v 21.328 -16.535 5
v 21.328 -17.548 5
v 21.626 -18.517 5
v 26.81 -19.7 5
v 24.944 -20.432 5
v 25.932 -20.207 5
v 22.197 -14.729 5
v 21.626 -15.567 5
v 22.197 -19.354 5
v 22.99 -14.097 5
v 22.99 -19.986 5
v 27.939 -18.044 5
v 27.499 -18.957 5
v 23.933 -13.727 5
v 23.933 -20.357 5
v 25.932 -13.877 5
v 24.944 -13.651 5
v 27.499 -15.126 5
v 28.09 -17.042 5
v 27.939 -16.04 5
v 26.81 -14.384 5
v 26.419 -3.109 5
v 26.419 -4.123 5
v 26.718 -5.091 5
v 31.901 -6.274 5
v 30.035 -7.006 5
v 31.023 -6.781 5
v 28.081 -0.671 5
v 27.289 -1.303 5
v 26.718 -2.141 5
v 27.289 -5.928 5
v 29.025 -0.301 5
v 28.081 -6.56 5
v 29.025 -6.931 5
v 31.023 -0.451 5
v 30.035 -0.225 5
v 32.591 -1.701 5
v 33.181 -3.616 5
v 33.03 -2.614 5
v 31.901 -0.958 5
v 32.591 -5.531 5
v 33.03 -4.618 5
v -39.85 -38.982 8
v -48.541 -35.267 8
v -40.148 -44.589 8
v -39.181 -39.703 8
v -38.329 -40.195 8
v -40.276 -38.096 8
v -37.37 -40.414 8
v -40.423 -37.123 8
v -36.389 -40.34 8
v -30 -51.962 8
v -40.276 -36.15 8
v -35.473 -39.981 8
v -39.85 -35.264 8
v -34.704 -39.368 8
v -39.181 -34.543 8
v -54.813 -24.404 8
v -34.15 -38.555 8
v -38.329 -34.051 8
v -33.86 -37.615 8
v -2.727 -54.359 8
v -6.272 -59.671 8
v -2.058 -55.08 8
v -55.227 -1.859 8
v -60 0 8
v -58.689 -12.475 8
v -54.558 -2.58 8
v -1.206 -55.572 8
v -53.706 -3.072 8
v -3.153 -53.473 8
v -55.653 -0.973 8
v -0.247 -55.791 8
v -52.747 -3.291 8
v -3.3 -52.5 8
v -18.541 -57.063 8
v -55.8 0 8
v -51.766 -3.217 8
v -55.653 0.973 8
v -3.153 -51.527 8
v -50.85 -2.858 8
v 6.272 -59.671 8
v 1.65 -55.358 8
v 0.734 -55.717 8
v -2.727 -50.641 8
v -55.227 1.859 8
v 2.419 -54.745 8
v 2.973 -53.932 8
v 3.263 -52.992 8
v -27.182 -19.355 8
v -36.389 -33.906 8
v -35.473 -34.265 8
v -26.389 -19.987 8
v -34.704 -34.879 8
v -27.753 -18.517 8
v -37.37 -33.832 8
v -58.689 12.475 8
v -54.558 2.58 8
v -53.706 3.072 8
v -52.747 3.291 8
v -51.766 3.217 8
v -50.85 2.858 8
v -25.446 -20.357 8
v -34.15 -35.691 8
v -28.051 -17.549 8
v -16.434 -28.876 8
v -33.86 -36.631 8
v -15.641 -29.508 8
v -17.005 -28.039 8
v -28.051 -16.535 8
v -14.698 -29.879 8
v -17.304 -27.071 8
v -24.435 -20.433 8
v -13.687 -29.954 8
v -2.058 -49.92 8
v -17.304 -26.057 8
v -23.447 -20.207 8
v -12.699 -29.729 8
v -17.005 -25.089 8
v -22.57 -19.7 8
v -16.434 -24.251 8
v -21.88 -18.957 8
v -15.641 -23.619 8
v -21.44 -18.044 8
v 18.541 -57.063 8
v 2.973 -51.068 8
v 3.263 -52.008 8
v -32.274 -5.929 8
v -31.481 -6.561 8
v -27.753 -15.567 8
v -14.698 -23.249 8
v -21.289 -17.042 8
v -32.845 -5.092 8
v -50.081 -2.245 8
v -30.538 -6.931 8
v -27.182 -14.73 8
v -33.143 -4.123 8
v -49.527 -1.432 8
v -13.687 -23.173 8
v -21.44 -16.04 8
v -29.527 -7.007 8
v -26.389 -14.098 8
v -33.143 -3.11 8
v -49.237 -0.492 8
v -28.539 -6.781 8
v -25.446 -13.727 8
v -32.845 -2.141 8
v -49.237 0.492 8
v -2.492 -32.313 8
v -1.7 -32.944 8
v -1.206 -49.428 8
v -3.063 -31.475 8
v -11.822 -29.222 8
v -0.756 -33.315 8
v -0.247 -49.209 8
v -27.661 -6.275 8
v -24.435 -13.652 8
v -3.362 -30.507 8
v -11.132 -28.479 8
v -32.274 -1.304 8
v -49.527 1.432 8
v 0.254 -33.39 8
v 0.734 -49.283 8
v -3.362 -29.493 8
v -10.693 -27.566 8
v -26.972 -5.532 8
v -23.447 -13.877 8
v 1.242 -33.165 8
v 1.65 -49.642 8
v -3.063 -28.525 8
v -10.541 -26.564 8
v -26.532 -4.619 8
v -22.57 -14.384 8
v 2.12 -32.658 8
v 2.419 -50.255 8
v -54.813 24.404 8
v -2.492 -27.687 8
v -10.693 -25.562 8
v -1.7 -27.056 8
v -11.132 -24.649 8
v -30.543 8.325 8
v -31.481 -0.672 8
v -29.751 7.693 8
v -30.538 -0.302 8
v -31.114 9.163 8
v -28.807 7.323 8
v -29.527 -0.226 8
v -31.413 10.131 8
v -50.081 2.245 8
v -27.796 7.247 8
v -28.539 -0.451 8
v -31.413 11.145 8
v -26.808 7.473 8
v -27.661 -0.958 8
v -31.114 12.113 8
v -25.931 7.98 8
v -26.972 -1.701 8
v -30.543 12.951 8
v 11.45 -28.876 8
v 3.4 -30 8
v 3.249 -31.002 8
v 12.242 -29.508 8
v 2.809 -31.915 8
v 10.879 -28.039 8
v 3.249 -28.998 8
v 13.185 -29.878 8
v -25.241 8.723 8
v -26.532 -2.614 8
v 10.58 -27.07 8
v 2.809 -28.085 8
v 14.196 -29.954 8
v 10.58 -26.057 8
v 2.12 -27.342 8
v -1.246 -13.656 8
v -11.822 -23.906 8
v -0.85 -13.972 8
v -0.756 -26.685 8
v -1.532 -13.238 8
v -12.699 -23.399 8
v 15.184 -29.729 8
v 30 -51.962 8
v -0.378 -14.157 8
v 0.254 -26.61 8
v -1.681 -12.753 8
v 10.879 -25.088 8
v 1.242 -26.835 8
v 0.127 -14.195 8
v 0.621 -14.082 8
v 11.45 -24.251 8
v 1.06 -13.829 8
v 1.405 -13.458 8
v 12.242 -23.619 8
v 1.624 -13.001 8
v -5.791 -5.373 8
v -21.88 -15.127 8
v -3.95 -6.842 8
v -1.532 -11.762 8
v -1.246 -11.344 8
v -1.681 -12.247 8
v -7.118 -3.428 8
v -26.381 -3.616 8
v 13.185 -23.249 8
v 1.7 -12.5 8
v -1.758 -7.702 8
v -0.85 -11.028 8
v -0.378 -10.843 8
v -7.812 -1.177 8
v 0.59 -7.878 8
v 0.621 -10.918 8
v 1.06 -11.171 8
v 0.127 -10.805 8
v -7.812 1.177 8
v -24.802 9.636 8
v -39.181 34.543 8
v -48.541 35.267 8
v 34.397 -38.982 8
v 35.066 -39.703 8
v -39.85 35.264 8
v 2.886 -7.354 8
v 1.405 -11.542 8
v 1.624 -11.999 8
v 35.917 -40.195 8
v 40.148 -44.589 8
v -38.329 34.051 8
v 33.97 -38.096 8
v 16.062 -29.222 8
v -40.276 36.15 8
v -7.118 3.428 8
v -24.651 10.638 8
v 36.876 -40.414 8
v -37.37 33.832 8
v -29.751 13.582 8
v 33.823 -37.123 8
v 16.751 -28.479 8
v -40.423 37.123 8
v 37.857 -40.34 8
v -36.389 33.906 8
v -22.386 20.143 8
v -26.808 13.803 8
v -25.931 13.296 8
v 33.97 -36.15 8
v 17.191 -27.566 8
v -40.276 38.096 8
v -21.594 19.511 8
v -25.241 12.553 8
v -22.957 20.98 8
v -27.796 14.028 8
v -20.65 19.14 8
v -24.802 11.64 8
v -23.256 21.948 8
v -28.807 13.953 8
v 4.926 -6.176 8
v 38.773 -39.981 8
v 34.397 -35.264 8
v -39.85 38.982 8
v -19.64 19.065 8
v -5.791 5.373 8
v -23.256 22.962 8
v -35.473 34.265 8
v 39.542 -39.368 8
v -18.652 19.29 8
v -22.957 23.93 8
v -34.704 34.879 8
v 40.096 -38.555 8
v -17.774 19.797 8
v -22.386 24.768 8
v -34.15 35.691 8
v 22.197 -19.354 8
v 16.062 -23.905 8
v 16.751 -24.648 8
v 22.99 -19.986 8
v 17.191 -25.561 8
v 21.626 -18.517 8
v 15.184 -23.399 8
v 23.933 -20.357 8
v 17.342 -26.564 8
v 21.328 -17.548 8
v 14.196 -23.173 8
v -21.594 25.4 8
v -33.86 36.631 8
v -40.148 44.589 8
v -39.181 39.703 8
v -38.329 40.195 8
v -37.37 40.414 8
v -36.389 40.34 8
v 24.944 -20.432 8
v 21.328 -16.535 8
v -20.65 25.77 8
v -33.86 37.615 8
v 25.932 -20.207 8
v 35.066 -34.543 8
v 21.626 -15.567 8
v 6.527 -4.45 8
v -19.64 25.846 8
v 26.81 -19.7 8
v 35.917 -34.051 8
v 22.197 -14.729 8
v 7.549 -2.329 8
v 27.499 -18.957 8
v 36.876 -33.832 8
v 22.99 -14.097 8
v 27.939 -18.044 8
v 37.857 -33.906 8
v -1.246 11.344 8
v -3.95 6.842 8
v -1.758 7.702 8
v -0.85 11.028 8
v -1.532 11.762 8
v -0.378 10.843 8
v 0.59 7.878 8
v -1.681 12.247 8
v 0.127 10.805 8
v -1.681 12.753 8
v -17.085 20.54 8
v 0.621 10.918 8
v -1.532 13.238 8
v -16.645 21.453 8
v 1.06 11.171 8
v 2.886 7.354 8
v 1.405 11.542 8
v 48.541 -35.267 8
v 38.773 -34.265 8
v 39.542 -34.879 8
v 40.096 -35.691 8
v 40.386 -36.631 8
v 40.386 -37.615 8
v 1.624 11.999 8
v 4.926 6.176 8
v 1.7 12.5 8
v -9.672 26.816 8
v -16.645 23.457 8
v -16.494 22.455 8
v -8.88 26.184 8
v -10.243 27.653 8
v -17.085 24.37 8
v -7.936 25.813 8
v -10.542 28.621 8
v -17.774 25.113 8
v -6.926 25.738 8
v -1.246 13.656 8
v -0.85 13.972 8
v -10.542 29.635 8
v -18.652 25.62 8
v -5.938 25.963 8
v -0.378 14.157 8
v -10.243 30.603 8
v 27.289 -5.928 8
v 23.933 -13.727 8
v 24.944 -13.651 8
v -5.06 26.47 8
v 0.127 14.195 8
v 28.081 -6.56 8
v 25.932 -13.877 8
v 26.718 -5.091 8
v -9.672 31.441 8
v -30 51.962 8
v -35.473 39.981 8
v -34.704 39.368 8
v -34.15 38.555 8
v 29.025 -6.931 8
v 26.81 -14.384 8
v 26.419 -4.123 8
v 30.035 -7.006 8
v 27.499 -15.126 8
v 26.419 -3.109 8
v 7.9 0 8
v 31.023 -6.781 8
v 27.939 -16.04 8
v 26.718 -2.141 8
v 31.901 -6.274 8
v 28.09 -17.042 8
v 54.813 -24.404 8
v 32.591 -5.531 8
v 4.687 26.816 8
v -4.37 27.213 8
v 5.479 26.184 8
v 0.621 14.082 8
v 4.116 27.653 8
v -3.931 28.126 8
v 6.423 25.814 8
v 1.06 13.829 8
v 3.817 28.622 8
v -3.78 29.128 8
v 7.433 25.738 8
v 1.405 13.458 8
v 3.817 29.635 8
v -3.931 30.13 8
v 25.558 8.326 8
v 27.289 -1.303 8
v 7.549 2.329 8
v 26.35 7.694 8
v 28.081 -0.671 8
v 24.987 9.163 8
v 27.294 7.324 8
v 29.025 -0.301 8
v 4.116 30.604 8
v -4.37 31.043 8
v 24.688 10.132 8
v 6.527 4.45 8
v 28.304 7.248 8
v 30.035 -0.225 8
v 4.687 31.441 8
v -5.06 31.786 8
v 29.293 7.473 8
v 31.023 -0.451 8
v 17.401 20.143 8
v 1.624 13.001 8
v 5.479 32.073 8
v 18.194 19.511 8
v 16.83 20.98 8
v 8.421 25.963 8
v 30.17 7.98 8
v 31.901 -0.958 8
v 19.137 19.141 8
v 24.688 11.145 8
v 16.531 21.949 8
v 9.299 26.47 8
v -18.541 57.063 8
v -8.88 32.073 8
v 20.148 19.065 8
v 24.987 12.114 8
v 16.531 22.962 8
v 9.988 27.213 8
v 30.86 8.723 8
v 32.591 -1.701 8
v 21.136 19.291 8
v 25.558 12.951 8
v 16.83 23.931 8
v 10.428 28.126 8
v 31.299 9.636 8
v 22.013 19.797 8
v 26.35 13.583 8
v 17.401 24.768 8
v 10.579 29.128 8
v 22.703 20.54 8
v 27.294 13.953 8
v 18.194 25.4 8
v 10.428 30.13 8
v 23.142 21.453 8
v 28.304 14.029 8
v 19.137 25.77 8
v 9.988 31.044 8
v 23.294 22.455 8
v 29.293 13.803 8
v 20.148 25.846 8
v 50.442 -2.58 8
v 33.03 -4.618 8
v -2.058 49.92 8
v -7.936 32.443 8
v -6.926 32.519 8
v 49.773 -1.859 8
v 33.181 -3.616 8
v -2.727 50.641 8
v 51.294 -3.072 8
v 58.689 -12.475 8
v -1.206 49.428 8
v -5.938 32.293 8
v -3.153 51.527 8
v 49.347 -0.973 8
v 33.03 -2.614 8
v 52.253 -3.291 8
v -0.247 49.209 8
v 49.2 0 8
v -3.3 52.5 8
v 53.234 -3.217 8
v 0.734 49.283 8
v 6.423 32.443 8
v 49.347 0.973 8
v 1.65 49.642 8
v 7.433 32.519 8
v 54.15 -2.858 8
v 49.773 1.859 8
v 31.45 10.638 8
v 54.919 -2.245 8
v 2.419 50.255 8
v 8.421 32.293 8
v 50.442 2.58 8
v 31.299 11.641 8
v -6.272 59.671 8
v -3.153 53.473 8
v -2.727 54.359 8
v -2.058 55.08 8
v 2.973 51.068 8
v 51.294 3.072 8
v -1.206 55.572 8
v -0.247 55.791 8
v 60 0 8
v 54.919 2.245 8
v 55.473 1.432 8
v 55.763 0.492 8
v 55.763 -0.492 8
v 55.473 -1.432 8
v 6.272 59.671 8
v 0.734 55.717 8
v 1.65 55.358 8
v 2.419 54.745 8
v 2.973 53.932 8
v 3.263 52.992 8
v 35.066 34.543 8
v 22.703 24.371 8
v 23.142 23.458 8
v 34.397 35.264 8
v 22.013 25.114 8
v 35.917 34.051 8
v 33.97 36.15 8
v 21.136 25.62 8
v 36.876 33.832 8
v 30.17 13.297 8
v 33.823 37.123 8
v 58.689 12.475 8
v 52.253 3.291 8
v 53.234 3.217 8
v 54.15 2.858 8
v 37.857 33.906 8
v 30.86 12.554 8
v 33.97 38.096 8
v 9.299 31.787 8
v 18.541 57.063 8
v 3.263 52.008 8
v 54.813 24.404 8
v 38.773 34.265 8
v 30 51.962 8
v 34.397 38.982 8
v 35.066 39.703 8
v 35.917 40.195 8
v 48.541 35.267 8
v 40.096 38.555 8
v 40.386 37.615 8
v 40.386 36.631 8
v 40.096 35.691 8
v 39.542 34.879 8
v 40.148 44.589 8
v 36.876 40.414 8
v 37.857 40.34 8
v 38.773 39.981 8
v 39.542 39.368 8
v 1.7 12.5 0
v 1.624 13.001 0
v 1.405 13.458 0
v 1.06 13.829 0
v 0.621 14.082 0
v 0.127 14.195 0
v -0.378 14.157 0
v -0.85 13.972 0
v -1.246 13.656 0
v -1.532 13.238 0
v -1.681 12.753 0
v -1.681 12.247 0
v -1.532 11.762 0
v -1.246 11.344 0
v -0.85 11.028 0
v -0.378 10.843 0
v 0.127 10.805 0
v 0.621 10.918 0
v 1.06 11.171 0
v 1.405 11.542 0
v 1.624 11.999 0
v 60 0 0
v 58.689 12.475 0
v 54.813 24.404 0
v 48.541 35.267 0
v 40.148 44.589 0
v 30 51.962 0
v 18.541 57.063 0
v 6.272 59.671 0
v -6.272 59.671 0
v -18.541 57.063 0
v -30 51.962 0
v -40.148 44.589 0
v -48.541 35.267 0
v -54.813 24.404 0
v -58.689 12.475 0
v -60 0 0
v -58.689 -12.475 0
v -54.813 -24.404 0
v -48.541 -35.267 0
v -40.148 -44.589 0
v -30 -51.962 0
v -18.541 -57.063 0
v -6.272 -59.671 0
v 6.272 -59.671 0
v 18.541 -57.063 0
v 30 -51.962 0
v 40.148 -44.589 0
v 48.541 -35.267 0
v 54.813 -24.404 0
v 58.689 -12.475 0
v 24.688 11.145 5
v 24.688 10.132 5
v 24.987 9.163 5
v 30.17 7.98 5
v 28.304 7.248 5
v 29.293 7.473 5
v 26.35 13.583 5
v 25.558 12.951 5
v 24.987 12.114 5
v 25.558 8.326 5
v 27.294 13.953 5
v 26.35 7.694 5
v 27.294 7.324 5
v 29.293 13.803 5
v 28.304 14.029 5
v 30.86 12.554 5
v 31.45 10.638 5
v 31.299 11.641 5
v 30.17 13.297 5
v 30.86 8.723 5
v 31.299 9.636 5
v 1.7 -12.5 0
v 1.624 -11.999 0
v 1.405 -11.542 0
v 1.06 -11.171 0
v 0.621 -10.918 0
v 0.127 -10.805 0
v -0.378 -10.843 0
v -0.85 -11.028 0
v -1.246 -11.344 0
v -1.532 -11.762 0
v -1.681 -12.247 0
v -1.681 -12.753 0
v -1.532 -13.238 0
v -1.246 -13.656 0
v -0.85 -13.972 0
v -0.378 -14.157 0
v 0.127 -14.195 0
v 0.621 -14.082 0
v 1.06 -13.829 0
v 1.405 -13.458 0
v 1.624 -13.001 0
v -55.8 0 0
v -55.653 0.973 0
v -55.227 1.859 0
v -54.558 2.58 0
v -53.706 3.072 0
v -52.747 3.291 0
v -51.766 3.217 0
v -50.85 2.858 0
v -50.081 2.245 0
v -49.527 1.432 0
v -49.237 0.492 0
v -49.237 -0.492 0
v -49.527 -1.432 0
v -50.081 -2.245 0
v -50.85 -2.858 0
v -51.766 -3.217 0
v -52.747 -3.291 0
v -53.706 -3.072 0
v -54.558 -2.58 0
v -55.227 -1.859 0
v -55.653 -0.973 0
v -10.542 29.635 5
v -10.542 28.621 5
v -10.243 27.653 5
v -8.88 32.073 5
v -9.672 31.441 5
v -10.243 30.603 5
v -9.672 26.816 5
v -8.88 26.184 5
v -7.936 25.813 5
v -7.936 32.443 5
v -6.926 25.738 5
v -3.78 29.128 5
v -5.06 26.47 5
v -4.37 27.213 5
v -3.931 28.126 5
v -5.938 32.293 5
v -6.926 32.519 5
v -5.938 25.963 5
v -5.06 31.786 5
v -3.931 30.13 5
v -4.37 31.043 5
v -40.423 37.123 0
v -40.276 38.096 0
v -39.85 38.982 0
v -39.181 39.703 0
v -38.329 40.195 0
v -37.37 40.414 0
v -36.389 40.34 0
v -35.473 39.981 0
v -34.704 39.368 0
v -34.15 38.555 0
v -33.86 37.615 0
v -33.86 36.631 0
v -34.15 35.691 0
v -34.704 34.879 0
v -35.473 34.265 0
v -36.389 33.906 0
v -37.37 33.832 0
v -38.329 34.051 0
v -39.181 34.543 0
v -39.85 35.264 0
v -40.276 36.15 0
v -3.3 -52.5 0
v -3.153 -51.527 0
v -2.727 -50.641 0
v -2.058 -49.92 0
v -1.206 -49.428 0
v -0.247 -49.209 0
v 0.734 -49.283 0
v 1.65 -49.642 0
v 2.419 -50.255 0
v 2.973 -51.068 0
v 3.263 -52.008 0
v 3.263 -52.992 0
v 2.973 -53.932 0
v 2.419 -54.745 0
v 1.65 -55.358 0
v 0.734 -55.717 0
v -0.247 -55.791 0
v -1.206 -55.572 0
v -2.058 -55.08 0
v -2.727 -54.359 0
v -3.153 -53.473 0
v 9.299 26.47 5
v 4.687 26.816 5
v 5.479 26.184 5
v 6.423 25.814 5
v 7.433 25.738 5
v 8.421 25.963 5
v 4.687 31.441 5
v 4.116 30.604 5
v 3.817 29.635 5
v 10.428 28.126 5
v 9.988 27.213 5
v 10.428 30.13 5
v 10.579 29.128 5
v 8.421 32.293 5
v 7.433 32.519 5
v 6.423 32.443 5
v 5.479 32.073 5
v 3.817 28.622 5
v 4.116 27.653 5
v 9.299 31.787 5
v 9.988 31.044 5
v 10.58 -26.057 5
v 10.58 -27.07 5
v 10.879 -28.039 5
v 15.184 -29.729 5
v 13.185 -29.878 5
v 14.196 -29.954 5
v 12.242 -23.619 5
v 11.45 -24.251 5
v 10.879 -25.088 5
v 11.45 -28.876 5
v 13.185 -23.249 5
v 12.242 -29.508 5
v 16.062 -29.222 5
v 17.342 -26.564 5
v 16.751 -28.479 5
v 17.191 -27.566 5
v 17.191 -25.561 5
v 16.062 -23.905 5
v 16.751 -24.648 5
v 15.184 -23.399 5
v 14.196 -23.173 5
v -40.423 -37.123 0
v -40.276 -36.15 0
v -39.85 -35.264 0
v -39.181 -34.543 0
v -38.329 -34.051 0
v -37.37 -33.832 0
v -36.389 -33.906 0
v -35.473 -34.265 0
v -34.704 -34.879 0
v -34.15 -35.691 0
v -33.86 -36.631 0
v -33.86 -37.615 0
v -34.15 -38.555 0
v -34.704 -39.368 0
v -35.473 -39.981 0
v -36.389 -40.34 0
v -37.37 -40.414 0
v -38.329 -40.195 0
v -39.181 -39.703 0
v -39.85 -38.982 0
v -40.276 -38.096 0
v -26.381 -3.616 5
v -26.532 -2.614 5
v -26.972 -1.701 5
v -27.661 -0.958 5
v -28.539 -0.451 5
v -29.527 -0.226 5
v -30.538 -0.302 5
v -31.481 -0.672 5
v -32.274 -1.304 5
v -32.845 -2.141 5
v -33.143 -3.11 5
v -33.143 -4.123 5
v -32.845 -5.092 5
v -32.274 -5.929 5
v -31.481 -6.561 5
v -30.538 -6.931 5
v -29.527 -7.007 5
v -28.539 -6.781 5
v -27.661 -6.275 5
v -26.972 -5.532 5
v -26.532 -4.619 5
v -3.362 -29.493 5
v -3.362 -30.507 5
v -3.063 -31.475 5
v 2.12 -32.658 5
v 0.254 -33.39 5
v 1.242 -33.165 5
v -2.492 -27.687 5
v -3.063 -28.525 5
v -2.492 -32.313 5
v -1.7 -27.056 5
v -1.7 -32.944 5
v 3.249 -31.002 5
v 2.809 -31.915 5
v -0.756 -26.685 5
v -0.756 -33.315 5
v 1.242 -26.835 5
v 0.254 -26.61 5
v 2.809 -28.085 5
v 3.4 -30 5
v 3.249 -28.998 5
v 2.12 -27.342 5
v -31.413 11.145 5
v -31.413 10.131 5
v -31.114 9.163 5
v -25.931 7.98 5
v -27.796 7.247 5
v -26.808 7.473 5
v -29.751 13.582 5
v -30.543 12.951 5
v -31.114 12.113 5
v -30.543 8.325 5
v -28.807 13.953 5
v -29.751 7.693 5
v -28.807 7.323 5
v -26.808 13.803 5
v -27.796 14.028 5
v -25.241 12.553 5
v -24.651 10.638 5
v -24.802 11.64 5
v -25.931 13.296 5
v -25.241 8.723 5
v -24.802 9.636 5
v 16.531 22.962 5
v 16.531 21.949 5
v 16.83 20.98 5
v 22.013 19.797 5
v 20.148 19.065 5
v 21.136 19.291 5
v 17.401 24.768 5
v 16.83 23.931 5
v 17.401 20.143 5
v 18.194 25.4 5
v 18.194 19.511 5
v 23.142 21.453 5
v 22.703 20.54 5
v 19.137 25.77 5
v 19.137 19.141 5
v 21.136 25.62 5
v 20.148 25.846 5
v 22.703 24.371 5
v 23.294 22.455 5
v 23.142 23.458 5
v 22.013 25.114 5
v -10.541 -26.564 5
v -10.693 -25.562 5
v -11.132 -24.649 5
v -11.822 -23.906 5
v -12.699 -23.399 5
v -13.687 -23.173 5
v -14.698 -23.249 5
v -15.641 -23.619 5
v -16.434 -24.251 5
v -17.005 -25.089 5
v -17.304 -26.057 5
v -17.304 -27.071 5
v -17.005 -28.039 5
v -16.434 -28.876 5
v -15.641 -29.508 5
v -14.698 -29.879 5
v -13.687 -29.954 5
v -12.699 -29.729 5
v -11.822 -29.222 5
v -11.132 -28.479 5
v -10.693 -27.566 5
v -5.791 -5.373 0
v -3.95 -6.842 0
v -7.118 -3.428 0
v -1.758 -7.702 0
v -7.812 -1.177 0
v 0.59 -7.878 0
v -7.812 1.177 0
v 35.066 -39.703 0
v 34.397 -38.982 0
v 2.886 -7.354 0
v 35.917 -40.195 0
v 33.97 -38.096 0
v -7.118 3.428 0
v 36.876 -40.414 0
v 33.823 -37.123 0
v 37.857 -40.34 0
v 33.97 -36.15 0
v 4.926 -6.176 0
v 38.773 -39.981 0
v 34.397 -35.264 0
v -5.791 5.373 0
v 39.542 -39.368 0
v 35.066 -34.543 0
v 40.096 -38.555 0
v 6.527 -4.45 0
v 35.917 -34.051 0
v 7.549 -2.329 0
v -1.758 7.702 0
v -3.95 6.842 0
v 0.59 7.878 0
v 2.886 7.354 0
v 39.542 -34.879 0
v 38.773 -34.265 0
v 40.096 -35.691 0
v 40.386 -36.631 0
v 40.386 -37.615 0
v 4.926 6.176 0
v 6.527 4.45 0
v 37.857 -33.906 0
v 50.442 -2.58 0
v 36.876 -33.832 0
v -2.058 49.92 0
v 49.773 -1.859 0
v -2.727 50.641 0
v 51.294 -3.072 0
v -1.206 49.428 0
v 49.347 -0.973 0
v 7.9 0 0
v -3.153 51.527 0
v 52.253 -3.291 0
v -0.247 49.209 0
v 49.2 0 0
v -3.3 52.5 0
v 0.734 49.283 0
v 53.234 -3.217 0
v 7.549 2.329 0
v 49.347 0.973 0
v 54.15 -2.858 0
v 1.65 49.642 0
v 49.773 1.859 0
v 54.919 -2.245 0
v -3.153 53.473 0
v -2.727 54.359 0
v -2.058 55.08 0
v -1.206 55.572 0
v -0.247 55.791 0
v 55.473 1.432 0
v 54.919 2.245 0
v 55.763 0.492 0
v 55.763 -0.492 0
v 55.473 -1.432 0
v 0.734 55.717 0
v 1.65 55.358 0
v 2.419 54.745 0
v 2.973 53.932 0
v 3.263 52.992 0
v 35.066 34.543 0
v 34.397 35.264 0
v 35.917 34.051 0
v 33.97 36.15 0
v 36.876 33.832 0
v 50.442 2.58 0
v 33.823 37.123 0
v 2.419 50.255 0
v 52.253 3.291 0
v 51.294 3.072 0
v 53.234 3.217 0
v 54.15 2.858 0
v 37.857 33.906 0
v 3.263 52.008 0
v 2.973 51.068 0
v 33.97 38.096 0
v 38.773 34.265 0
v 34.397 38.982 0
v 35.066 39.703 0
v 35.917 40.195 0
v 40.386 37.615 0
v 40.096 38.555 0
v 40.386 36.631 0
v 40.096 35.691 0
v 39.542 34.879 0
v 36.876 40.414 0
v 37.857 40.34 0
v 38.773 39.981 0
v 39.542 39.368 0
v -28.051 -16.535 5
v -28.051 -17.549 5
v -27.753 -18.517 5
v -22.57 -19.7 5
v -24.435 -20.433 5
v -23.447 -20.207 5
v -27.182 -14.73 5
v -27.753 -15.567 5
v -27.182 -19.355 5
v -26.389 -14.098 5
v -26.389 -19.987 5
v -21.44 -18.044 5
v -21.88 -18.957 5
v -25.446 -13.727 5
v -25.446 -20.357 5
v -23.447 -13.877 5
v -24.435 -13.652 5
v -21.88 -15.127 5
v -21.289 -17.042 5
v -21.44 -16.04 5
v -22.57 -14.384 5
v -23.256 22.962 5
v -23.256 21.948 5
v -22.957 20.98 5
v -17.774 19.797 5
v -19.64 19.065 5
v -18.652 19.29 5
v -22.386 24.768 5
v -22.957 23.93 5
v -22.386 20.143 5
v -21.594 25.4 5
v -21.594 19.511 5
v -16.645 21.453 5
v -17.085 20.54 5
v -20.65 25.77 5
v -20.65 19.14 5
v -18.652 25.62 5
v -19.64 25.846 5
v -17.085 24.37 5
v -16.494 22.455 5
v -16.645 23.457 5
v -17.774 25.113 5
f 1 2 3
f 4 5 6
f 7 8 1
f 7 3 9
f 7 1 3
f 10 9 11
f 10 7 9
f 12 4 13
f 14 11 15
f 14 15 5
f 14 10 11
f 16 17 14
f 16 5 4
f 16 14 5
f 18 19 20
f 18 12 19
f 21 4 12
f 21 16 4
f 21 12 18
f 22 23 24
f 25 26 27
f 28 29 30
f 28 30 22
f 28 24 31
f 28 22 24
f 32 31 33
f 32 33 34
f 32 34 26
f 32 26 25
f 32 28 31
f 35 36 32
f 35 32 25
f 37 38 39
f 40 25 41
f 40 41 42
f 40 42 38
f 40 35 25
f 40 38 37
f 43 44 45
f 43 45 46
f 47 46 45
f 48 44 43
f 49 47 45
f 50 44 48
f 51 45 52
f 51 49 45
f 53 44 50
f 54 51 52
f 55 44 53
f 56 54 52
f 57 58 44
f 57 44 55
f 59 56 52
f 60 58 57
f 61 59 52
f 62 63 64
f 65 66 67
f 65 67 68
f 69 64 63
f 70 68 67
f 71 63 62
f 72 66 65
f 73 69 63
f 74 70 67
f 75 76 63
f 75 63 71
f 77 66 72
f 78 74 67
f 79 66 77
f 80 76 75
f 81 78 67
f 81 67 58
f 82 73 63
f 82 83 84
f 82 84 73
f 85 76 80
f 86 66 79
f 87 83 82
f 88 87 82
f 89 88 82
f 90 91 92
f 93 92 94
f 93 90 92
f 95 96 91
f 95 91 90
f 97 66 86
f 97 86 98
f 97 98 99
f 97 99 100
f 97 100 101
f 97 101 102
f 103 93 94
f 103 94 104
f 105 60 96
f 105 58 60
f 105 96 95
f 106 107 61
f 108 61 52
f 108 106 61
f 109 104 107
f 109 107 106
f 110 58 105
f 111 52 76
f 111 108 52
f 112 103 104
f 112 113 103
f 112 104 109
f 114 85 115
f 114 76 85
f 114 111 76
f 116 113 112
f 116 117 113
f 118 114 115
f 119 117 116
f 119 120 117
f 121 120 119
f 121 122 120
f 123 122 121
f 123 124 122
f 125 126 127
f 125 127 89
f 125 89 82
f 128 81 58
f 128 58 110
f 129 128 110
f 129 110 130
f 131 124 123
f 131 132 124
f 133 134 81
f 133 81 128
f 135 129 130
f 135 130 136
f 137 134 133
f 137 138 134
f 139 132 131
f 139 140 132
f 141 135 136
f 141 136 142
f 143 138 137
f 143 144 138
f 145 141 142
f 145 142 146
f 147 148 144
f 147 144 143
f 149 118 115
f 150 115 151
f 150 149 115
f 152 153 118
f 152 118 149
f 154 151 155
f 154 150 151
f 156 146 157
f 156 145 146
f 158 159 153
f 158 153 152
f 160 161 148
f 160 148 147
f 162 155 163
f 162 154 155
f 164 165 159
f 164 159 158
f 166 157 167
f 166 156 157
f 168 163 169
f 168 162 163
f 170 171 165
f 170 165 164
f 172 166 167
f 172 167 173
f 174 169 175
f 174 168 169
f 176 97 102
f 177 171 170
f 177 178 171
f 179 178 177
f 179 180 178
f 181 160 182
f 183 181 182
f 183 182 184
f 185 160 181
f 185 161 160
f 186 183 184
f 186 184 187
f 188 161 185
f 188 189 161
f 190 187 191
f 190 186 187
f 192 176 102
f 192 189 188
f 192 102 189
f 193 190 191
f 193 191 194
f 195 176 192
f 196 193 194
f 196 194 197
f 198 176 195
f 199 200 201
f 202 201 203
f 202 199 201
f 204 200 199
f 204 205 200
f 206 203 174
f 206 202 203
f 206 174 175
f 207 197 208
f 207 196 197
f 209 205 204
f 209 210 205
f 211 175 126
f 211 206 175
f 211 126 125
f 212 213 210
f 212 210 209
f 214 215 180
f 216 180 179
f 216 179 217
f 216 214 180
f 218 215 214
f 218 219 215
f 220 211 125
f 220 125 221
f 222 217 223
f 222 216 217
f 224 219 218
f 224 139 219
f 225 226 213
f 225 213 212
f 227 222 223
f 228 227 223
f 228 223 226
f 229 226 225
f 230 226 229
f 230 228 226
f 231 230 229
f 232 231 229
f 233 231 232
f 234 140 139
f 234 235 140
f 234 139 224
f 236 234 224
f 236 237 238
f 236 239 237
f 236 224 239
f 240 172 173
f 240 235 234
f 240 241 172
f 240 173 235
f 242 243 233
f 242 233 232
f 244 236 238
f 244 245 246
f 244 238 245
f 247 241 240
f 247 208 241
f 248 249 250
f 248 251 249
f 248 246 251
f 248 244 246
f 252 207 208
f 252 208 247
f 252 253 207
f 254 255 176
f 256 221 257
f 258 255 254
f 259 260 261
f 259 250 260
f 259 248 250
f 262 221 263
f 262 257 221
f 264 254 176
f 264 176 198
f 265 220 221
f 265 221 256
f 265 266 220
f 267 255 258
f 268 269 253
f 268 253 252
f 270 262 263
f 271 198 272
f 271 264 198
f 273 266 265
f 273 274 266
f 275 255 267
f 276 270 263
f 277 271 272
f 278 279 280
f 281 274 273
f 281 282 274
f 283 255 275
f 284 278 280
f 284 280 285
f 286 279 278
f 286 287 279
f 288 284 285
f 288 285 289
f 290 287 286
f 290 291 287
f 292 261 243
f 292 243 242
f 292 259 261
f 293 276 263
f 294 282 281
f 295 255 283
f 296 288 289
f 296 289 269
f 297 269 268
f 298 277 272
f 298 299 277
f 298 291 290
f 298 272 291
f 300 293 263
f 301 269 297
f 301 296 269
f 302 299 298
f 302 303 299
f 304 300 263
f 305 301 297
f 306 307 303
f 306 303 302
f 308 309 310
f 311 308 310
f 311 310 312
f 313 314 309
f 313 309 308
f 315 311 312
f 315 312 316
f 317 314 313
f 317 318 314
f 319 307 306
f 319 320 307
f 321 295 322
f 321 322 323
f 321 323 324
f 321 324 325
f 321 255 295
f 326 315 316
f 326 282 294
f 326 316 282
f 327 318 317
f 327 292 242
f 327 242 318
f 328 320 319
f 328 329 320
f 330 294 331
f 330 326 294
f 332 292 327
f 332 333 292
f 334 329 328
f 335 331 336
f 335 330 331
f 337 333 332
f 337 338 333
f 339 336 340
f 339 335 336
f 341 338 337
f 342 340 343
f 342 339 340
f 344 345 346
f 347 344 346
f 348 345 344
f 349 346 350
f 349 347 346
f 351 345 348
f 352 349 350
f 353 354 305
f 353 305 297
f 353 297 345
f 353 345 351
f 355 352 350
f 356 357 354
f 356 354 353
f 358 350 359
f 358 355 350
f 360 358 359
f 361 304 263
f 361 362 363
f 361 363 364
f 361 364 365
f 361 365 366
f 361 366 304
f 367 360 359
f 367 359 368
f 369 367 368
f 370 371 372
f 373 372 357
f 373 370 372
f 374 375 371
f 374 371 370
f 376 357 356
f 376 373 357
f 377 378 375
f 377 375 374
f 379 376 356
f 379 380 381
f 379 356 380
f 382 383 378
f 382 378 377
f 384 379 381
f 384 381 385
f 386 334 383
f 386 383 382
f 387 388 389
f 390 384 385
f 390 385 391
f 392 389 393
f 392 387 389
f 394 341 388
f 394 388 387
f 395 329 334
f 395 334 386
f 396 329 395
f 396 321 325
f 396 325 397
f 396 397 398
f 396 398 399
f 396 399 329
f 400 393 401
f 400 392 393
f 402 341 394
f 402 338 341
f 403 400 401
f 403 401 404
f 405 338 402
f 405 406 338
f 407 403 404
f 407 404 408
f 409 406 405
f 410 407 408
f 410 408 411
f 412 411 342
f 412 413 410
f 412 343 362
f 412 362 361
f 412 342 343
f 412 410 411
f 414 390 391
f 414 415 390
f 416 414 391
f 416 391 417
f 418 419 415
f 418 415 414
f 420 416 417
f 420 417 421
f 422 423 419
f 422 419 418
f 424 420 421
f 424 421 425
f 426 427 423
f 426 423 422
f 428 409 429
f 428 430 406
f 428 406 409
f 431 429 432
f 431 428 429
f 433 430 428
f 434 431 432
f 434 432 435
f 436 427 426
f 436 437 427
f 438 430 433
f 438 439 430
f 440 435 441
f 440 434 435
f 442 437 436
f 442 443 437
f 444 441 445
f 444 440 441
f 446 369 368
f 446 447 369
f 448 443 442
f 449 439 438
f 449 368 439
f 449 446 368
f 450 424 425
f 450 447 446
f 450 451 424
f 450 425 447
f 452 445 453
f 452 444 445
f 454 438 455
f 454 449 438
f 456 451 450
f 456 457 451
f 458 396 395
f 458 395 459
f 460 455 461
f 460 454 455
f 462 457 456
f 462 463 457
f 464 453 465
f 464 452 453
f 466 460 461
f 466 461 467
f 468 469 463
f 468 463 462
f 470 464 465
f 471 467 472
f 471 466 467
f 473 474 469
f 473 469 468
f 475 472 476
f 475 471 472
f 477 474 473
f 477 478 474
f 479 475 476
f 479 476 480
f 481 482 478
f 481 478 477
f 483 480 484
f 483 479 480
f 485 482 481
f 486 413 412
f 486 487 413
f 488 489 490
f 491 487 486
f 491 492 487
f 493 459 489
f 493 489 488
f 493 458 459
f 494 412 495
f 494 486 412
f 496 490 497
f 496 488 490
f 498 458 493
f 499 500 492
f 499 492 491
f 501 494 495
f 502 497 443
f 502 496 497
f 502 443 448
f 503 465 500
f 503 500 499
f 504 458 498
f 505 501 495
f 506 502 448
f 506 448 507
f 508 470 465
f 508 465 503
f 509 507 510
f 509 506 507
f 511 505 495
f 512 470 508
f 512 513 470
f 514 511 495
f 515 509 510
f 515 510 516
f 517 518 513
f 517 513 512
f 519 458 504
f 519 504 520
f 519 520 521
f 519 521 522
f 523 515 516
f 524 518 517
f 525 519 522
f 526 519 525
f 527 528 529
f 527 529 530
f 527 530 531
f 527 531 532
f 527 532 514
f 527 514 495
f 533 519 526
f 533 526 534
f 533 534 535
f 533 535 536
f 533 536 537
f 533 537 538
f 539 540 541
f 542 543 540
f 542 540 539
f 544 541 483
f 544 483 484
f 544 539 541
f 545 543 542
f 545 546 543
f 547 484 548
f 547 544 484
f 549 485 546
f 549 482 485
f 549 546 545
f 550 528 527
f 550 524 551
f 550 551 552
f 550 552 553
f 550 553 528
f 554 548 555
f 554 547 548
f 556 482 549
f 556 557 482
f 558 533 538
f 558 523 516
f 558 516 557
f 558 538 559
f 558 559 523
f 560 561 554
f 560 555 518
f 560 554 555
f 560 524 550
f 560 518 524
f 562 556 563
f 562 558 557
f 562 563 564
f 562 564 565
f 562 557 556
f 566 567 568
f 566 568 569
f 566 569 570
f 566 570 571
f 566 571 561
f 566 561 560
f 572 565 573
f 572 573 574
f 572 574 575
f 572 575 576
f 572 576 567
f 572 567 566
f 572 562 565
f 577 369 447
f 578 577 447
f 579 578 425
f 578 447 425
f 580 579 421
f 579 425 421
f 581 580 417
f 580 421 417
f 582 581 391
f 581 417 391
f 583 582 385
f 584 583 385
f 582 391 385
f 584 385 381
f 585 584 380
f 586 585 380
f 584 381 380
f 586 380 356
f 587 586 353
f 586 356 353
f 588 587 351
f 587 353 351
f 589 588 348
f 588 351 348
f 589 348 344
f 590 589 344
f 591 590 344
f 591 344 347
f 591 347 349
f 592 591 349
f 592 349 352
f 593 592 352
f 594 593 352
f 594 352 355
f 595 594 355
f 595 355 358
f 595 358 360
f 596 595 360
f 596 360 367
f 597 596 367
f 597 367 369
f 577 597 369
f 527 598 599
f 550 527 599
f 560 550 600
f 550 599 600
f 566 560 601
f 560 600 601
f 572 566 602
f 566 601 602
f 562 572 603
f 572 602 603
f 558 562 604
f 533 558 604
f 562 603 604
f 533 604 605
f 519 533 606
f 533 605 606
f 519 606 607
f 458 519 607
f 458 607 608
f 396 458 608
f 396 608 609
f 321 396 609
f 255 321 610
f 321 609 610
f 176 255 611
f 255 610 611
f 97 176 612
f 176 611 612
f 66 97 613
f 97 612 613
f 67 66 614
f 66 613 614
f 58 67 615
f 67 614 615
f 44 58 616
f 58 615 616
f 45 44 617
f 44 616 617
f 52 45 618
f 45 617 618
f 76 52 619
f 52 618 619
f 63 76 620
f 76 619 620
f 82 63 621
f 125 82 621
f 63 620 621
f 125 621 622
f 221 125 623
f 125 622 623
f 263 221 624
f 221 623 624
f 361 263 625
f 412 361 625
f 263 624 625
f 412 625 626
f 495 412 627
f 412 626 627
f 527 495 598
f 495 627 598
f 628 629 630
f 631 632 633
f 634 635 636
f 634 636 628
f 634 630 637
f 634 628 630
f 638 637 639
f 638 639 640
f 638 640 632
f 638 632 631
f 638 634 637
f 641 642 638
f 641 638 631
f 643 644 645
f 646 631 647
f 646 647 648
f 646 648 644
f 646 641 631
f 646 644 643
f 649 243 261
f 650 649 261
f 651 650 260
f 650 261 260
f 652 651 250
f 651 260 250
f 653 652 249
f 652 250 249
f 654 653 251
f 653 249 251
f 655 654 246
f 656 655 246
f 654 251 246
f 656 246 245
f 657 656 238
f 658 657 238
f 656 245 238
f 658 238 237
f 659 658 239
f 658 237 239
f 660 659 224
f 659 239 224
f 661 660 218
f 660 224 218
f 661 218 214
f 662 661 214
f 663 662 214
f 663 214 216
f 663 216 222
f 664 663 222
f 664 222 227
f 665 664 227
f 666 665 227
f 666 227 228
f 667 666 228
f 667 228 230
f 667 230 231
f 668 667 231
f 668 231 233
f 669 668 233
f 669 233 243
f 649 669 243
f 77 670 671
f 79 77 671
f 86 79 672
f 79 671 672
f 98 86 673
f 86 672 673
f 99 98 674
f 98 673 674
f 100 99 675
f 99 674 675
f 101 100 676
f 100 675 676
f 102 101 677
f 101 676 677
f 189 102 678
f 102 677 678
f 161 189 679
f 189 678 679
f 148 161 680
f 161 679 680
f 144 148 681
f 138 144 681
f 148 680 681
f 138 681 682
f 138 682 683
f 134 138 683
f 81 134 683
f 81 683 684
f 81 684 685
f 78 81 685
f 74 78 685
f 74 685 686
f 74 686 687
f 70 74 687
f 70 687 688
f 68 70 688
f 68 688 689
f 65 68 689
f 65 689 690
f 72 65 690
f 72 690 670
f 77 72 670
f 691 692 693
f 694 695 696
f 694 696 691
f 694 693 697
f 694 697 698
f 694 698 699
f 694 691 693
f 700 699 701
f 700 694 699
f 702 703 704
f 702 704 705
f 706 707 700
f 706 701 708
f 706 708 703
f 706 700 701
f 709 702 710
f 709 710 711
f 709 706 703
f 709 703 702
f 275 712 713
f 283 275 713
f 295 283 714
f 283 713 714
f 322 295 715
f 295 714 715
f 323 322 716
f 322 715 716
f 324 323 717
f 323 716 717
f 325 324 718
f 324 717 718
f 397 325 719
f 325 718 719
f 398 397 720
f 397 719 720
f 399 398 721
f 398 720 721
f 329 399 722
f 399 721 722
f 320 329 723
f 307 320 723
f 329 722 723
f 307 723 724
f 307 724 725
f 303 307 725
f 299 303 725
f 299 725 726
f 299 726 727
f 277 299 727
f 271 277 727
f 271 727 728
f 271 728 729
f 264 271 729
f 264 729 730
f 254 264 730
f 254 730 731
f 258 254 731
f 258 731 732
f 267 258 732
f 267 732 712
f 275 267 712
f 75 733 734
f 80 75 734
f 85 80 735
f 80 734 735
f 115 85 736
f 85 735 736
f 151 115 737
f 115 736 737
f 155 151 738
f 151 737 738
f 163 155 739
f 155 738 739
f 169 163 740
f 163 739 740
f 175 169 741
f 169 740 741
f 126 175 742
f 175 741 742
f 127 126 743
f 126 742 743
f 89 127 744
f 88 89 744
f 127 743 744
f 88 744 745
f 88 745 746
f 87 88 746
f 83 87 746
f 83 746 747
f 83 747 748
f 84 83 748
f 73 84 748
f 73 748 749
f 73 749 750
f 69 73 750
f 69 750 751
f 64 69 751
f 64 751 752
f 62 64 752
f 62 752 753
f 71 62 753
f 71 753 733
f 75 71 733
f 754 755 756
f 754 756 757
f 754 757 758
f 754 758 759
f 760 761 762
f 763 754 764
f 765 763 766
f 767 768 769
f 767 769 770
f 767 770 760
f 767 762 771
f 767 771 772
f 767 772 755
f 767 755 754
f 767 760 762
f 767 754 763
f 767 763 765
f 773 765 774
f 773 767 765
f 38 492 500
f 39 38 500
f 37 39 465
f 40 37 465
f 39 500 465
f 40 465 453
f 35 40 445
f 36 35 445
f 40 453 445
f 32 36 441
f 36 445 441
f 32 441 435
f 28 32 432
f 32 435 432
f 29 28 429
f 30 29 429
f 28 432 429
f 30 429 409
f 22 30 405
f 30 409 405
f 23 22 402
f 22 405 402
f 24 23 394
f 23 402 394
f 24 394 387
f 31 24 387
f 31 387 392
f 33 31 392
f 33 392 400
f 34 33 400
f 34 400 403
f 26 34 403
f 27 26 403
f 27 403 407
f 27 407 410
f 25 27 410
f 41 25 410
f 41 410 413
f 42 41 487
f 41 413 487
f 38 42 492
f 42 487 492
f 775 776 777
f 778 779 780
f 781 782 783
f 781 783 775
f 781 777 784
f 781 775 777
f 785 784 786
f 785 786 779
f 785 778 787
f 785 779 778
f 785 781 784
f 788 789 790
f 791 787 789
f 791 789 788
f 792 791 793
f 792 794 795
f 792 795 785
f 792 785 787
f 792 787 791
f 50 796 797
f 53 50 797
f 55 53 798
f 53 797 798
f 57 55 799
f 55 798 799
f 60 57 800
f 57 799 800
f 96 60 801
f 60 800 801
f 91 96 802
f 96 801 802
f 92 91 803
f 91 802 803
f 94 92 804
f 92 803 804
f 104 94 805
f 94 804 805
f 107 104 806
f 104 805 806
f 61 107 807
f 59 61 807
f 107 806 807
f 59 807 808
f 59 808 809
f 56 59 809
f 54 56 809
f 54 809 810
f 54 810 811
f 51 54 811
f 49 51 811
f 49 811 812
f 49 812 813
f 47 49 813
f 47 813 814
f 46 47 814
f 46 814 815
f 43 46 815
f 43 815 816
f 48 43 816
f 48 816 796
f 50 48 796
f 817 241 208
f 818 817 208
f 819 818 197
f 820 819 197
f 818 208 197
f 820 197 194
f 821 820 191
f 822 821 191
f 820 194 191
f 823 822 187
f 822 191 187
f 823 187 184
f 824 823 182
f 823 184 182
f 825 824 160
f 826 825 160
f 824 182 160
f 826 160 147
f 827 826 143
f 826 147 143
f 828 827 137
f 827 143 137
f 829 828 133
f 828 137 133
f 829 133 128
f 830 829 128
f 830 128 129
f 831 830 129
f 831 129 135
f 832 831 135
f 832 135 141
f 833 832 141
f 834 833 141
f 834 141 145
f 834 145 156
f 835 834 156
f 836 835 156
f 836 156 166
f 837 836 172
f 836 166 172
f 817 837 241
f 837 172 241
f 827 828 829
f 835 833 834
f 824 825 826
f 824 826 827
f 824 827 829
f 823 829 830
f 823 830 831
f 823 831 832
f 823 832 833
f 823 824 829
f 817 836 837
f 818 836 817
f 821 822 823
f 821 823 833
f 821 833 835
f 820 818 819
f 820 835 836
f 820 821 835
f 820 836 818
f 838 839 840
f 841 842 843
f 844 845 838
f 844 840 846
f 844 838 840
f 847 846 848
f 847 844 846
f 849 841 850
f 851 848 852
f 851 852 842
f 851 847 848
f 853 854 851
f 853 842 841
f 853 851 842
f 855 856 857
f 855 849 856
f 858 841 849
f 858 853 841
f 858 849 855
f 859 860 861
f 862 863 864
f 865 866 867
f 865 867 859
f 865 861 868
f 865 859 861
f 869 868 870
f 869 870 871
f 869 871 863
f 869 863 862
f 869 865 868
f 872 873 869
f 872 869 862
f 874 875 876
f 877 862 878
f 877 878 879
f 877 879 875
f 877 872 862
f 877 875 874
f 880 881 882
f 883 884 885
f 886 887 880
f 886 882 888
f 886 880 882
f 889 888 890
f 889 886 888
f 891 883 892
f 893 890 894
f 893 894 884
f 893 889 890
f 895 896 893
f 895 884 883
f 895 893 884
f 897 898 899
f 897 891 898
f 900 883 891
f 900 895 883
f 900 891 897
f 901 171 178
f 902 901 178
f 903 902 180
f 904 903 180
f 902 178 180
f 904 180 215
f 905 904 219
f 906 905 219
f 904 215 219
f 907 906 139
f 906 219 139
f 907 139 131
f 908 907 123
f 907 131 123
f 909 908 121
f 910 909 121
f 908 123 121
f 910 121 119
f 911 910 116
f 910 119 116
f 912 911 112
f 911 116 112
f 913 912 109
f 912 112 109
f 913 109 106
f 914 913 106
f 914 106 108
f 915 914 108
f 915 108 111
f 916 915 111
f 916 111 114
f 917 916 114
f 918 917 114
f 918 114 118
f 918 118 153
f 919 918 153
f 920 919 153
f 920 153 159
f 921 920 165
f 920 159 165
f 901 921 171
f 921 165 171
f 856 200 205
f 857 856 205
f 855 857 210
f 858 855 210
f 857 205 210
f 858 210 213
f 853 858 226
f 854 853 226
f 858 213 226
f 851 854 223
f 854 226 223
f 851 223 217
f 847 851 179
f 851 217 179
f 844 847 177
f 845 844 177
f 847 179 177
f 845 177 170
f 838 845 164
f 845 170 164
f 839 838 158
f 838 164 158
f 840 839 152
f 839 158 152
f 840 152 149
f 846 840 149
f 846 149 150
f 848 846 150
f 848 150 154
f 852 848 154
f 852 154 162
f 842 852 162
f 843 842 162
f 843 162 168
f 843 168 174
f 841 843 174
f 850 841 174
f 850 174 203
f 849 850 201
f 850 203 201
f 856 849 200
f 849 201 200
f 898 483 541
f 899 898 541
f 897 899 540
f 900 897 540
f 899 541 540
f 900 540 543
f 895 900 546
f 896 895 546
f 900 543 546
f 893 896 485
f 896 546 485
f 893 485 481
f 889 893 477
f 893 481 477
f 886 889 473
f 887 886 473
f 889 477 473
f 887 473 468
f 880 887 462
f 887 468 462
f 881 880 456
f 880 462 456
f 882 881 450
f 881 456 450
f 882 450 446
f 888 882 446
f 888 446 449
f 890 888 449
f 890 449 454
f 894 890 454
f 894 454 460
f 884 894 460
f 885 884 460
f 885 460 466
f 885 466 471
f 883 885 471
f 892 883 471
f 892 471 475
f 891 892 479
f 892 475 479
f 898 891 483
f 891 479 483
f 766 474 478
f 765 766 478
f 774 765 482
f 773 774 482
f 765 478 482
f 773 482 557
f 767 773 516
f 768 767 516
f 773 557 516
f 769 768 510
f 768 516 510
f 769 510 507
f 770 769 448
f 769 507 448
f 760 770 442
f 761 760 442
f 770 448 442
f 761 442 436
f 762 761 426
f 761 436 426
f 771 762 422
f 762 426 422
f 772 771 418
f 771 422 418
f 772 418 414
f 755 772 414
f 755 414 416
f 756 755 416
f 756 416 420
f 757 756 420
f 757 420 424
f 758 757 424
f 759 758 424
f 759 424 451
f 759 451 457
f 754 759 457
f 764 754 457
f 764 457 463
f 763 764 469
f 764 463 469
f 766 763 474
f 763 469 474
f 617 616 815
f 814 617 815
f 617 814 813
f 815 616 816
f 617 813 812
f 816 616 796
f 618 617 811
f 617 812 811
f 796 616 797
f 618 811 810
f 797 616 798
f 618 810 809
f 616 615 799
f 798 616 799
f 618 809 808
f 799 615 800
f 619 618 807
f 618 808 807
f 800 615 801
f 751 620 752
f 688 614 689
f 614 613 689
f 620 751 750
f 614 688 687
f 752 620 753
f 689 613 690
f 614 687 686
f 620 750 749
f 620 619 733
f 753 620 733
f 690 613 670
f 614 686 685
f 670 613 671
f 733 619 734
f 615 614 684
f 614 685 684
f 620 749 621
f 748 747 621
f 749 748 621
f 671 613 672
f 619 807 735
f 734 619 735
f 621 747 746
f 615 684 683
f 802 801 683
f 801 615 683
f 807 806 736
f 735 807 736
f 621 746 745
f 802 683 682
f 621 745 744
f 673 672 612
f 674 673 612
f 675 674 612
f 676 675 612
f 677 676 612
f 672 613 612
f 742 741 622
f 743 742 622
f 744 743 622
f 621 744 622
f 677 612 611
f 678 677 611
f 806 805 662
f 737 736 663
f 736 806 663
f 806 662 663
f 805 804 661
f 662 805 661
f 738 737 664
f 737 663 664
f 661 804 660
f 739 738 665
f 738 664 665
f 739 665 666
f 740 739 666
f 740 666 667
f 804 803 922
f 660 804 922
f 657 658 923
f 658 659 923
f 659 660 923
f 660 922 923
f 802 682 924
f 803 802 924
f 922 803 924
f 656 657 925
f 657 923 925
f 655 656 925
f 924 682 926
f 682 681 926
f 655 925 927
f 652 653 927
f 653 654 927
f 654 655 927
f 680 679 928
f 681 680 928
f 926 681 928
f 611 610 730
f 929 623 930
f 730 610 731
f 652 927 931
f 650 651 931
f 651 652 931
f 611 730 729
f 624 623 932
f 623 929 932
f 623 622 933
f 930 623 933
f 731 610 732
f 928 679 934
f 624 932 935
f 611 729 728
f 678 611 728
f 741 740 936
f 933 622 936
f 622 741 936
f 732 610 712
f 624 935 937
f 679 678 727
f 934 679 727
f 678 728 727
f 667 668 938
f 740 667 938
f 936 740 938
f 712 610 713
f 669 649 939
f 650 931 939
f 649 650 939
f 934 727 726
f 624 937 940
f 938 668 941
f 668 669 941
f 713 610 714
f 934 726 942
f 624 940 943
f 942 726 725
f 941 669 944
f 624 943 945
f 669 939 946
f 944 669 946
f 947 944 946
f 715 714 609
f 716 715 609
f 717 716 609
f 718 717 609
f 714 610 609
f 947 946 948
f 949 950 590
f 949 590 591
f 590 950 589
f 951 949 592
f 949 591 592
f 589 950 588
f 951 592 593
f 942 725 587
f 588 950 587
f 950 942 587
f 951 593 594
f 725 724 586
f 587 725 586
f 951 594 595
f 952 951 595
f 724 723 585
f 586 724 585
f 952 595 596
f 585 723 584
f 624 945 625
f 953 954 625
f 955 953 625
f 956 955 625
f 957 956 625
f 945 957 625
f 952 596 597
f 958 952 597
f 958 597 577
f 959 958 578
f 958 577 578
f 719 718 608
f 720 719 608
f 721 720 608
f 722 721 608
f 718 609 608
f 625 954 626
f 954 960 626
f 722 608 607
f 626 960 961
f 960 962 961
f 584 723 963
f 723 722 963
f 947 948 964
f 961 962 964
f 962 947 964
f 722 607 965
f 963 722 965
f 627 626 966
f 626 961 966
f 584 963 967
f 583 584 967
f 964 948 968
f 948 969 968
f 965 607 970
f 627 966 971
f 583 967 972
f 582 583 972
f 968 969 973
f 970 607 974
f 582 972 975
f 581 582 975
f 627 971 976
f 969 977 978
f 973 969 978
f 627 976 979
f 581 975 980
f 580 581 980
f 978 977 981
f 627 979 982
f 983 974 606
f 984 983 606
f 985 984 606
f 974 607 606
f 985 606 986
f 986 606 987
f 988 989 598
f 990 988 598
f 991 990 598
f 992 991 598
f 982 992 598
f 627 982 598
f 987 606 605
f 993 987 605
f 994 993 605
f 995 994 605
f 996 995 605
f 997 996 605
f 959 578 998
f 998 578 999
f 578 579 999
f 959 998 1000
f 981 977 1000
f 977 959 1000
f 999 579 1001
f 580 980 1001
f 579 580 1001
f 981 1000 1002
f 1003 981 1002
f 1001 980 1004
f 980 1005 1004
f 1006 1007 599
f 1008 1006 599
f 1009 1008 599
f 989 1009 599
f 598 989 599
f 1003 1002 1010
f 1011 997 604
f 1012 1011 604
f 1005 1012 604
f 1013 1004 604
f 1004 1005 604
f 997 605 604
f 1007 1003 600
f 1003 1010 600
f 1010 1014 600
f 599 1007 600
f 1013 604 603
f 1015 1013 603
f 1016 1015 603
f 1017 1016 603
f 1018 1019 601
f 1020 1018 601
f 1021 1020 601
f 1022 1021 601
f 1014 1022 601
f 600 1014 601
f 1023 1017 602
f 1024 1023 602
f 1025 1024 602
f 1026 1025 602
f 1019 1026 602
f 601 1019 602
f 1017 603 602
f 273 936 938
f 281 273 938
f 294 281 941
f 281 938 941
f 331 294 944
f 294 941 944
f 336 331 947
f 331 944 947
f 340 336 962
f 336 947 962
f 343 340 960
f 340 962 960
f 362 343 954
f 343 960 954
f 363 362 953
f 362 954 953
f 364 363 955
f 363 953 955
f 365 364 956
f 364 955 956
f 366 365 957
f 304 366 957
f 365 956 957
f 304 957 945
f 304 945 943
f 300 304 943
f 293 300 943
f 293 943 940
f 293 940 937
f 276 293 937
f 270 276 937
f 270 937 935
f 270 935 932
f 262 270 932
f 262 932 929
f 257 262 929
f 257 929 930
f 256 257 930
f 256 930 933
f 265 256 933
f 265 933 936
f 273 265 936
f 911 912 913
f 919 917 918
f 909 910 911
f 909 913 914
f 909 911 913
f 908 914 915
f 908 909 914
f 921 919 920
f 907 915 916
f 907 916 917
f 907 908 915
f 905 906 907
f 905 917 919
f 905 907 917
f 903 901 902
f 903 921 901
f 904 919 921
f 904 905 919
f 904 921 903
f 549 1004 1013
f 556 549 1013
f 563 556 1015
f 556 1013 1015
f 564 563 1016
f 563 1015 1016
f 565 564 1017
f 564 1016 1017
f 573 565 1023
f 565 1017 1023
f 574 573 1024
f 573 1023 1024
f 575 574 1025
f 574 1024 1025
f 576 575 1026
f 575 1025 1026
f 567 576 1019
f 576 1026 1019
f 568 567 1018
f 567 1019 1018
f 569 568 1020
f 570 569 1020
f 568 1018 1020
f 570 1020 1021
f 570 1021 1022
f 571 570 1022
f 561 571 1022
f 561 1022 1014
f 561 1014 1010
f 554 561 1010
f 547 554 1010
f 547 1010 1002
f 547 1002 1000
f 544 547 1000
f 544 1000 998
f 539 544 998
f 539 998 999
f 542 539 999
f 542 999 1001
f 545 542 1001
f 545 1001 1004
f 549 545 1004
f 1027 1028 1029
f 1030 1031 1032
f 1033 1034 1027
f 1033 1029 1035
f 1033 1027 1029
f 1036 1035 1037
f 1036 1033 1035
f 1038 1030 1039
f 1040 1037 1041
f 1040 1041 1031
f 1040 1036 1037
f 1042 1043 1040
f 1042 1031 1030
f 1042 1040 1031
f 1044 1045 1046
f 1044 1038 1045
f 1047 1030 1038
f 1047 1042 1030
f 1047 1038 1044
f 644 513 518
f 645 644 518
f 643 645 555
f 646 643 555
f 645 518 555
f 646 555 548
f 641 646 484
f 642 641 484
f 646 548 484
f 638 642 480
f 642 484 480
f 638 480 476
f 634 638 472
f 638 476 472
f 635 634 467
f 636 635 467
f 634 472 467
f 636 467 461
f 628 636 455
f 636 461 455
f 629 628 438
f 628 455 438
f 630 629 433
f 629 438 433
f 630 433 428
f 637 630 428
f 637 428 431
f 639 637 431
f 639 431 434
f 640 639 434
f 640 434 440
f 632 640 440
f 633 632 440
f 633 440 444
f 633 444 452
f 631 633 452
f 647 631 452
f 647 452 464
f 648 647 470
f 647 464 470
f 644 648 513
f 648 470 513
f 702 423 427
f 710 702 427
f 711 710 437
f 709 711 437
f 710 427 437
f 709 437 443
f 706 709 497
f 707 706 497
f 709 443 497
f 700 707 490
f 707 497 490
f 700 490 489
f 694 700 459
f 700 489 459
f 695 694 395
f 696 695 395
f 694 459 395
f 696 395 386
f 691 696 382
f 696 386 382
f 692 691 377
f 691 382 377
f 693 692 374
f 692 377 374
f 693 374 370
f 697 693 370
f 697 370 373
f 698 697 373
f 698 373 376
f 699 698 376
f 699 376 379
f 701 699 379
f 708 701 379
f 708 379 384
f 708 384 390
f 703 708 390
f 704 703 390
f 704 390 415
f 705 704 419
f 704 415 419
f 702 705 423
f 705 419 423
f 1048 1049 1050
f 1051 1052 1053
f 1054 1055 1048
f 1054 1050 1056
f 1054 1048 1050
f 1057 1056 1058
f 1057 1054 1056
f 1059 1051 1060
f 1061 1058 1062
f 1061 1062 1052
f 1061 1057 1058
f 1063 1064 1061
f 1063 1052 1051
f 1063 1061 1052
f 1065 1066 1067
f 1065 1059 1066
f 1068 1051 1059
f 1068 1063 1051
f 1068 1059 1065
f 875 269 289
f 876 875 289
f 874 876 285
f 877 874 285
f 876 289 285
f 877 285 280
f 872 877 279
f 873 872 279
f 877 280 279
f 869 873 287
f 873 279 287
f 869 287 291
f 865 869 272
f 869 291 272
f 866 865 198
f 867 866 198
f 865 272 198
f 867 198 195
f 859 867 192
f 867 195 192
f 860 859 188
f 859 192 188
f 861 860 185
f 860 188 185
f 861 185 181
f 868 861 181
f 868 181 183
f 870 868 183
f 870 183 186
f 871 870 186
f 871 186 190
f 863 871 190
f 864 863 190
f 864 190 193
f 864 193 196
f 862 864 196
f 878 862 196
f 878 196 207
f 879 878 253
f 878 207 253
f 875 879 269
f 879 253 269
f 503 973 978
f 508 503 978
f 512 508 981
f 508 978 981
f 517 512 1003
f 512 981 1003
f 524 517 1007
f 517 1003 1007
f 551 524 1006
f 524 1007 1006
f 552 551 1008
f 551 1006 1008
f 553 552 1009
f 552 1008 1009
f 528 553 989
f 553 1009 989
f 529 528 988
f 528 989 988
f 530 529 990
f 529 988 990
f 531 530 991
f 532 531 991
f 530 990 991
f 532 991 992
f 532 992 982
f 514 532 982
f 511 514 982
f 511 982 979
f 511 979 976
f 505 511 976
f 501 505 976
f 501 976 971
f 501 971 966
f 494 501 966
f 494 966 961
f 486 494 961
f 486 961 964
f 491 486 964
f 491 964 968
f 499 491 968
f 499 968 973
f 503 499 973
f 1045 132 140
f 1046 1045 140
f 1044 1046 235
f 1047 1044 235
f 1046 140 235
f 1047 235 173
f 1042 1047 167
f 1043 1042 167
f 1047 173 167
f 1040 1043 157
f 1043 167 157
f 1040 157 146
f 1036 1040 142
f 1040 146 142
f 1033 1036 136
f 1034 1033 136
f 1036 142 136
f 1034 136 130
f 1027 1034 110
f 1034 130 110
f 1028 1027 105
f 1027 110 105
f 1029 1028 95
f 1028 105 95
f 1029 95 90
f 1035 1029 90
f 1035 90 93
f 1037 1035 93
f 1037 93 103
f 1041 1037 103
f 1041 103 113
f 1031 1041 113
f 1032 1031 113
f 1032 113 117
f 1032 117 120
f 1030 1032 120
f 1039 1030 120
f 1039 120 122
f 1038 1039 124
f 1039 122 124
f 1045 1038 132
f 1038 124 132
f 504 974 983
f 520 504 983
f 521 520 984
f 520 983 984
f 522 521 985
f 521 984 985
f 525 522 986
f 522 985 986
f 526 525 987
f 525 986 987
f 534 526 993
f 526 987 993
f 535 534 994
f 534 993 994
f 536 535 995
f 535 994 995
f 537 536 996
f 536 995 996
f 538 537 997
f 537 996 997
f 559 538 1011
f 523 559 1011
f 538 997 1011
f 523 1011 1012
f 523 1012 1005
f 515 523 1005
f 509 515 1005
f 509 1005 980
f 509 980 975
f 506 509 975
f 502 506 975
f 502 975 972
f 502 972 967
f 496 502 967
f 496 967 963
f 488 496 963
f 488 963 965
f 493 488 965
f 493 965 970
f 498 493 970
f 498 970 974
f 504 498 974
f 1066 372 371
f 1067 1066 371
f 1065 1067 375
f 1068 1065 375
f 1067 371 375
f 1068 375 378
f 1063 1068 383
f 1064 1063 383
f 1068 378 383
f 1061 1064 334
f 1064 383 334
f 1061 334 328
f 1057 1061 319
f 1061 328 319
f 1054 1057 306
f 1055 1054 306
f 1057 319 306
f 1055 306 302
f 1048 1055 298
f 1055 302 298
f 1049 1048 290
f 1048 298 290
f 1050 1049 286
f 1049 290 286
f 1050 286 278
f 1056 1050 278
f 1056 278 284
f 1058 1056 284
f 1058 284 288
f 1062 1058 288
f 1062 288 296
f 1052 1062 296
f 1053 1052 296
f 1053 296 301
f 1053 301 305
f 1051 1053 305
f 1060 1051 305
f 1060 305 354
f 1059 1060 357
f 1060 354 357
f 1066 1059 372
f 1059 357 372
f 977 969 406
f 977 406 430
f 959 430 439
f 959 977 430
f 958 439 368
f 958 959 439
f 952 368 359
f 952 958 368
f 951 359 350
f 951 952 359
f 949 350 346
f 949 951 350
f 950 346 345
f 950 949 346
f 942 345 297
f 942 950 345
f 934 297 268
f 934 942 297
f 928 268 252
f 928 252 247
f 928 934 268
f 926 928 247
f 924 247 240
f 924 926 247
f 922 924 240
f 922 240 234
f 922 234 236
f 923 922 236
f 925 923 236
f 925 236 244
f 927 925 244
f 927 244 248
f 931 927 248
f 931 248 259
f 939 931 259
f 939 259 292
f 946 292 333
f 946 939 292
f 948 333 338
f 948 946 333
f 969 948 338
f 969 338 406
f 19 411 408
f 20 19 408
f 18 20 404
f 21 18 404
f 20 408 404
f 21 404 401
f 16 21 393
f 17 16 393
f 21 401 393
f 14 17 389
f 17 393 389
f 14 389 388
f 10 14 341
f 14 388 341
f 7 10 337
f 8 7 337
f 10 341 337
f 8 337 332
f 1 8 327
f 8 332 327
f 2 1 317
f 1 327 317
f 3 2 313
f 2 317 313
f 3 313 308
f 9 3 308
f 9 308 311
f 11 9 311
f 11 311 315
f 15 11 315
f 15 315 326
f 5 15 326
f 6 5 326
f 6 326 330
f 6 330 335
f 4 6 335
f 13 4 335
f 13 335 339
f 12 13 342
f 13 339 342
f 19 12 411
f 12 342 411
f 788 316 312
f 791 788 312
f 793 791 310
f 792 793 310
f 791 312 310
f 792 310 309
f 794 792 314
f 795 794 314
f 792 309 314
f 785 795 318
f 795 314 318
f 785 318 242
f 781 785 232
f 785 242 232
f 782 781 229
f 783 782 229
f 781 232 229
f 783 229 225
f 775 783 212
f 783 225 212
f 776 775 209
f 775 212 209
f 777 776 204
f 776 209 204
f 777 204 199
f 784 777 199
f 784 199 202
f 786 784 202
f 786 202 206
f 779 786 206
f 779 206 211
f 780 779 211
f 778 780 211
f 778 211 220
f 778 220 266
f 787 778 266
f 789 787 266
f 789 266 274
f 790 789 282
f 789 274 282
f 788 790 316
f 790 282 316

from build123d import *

# Parameters (mm, degrees)
SKETCH1_R            = 60
SKETCH1_R_2          = 7.9
BOSS_EXTRUDE1_DEPTH  = 8
SKETCH2_R            = 1.7
CUT_EXTRUDE1_DEPTH   = 9
SKETCH3_R            = 3.4
CUT_EXTRUDE2_DEPTH   = 3
M6_CLEARANCE_HOLE1_D = 6.6


with BuildPart() as part:
    # Sketch1 → Boss-Extrude1 (new body)
    with BuildSketch(Plane.XY):
        Circle(SKETCH1_R)
        Circle(SKETCH1_R_2, mode=Mode.SUBTRACT)
    extrude(amount=BOSS_EXTRUDE1_DEPTH)

    # Sketch2 → Cut-Extrude1 (cut, through all)
    with BuildSketch(Plane.XY.offset(8)):
        with Locations((0, 12.5)):
            Circle(SKETCH2_R)
        with Locations((0, -12.5)):
            Circle(SKETCH2_R)
    extrude(amount=-CUT_EXTRUDE1_DEPTH, mode=Mode.SUBTRACT)

    # Sketch3 → Cut-Extrude2 (cut)
    with BuildSketch(Plane.XY.offset(8)):
        with Locations((29.781294677, -3.615866061)):
            Circle(SKETCH3_R)
        with Locations((24.689650078, -17.041748121)):
            Circle(SKETCH3_R)
        with Locations((13.941904189, -26.563571062)):
            Circle(SKETCH3_R)
        with Locations((0.000236068, -29.999999999)):
            Circle(SKETCH3_R)
        with Locations((-13.941486133, -26.563790475)):
            Circle(SKETCH3_R)
        with Locations((-24.689381874, -17.042136682)):
            Circle(SKETCH3_R)
        with Locations((-29.781237767, -3.616334754)):
            Circle(SKETCH3_R)
        with Locations((-28.050570991, 10.637925883)):
            Circle(SKETCH3_R)
        with Locations((-19.893856446, 22.455165902)):
            Circle(SKETCH3_R)
        with Locations((-7.179699137, 29.128198027)):
            Circle(SKETCH3_R)
        with Locations((7.17924072, 29.128311017)):
            Circle(SKETCH3_R)
        with Locations((19.893503047, 22.455478987)):
            Circle(SKETCH3_R)
        with Locations((28.050403569, 10.638367338)):
            Circle(SKETCH3_R)
    extrude(amount=-CUT_EXTRUDE2_DEPTH, mode=Mode.SUBTRACT)

    # M6 Clearance Hole1 (through all)
    with Locations(Plane.XY.offset(8)):
        with Locations((-37.123106012, 37.123106012), (0, 52.5), (37.123106012, 37.123106012), (52.5, 0), (37.123106012, -37.123106012), (0, -52.5), (-37.123106012, -37.123106012), (-52.5, 0)):
            Hole(M6_CLEARANCE_HOLE1_D / 2)


solid = part.part
